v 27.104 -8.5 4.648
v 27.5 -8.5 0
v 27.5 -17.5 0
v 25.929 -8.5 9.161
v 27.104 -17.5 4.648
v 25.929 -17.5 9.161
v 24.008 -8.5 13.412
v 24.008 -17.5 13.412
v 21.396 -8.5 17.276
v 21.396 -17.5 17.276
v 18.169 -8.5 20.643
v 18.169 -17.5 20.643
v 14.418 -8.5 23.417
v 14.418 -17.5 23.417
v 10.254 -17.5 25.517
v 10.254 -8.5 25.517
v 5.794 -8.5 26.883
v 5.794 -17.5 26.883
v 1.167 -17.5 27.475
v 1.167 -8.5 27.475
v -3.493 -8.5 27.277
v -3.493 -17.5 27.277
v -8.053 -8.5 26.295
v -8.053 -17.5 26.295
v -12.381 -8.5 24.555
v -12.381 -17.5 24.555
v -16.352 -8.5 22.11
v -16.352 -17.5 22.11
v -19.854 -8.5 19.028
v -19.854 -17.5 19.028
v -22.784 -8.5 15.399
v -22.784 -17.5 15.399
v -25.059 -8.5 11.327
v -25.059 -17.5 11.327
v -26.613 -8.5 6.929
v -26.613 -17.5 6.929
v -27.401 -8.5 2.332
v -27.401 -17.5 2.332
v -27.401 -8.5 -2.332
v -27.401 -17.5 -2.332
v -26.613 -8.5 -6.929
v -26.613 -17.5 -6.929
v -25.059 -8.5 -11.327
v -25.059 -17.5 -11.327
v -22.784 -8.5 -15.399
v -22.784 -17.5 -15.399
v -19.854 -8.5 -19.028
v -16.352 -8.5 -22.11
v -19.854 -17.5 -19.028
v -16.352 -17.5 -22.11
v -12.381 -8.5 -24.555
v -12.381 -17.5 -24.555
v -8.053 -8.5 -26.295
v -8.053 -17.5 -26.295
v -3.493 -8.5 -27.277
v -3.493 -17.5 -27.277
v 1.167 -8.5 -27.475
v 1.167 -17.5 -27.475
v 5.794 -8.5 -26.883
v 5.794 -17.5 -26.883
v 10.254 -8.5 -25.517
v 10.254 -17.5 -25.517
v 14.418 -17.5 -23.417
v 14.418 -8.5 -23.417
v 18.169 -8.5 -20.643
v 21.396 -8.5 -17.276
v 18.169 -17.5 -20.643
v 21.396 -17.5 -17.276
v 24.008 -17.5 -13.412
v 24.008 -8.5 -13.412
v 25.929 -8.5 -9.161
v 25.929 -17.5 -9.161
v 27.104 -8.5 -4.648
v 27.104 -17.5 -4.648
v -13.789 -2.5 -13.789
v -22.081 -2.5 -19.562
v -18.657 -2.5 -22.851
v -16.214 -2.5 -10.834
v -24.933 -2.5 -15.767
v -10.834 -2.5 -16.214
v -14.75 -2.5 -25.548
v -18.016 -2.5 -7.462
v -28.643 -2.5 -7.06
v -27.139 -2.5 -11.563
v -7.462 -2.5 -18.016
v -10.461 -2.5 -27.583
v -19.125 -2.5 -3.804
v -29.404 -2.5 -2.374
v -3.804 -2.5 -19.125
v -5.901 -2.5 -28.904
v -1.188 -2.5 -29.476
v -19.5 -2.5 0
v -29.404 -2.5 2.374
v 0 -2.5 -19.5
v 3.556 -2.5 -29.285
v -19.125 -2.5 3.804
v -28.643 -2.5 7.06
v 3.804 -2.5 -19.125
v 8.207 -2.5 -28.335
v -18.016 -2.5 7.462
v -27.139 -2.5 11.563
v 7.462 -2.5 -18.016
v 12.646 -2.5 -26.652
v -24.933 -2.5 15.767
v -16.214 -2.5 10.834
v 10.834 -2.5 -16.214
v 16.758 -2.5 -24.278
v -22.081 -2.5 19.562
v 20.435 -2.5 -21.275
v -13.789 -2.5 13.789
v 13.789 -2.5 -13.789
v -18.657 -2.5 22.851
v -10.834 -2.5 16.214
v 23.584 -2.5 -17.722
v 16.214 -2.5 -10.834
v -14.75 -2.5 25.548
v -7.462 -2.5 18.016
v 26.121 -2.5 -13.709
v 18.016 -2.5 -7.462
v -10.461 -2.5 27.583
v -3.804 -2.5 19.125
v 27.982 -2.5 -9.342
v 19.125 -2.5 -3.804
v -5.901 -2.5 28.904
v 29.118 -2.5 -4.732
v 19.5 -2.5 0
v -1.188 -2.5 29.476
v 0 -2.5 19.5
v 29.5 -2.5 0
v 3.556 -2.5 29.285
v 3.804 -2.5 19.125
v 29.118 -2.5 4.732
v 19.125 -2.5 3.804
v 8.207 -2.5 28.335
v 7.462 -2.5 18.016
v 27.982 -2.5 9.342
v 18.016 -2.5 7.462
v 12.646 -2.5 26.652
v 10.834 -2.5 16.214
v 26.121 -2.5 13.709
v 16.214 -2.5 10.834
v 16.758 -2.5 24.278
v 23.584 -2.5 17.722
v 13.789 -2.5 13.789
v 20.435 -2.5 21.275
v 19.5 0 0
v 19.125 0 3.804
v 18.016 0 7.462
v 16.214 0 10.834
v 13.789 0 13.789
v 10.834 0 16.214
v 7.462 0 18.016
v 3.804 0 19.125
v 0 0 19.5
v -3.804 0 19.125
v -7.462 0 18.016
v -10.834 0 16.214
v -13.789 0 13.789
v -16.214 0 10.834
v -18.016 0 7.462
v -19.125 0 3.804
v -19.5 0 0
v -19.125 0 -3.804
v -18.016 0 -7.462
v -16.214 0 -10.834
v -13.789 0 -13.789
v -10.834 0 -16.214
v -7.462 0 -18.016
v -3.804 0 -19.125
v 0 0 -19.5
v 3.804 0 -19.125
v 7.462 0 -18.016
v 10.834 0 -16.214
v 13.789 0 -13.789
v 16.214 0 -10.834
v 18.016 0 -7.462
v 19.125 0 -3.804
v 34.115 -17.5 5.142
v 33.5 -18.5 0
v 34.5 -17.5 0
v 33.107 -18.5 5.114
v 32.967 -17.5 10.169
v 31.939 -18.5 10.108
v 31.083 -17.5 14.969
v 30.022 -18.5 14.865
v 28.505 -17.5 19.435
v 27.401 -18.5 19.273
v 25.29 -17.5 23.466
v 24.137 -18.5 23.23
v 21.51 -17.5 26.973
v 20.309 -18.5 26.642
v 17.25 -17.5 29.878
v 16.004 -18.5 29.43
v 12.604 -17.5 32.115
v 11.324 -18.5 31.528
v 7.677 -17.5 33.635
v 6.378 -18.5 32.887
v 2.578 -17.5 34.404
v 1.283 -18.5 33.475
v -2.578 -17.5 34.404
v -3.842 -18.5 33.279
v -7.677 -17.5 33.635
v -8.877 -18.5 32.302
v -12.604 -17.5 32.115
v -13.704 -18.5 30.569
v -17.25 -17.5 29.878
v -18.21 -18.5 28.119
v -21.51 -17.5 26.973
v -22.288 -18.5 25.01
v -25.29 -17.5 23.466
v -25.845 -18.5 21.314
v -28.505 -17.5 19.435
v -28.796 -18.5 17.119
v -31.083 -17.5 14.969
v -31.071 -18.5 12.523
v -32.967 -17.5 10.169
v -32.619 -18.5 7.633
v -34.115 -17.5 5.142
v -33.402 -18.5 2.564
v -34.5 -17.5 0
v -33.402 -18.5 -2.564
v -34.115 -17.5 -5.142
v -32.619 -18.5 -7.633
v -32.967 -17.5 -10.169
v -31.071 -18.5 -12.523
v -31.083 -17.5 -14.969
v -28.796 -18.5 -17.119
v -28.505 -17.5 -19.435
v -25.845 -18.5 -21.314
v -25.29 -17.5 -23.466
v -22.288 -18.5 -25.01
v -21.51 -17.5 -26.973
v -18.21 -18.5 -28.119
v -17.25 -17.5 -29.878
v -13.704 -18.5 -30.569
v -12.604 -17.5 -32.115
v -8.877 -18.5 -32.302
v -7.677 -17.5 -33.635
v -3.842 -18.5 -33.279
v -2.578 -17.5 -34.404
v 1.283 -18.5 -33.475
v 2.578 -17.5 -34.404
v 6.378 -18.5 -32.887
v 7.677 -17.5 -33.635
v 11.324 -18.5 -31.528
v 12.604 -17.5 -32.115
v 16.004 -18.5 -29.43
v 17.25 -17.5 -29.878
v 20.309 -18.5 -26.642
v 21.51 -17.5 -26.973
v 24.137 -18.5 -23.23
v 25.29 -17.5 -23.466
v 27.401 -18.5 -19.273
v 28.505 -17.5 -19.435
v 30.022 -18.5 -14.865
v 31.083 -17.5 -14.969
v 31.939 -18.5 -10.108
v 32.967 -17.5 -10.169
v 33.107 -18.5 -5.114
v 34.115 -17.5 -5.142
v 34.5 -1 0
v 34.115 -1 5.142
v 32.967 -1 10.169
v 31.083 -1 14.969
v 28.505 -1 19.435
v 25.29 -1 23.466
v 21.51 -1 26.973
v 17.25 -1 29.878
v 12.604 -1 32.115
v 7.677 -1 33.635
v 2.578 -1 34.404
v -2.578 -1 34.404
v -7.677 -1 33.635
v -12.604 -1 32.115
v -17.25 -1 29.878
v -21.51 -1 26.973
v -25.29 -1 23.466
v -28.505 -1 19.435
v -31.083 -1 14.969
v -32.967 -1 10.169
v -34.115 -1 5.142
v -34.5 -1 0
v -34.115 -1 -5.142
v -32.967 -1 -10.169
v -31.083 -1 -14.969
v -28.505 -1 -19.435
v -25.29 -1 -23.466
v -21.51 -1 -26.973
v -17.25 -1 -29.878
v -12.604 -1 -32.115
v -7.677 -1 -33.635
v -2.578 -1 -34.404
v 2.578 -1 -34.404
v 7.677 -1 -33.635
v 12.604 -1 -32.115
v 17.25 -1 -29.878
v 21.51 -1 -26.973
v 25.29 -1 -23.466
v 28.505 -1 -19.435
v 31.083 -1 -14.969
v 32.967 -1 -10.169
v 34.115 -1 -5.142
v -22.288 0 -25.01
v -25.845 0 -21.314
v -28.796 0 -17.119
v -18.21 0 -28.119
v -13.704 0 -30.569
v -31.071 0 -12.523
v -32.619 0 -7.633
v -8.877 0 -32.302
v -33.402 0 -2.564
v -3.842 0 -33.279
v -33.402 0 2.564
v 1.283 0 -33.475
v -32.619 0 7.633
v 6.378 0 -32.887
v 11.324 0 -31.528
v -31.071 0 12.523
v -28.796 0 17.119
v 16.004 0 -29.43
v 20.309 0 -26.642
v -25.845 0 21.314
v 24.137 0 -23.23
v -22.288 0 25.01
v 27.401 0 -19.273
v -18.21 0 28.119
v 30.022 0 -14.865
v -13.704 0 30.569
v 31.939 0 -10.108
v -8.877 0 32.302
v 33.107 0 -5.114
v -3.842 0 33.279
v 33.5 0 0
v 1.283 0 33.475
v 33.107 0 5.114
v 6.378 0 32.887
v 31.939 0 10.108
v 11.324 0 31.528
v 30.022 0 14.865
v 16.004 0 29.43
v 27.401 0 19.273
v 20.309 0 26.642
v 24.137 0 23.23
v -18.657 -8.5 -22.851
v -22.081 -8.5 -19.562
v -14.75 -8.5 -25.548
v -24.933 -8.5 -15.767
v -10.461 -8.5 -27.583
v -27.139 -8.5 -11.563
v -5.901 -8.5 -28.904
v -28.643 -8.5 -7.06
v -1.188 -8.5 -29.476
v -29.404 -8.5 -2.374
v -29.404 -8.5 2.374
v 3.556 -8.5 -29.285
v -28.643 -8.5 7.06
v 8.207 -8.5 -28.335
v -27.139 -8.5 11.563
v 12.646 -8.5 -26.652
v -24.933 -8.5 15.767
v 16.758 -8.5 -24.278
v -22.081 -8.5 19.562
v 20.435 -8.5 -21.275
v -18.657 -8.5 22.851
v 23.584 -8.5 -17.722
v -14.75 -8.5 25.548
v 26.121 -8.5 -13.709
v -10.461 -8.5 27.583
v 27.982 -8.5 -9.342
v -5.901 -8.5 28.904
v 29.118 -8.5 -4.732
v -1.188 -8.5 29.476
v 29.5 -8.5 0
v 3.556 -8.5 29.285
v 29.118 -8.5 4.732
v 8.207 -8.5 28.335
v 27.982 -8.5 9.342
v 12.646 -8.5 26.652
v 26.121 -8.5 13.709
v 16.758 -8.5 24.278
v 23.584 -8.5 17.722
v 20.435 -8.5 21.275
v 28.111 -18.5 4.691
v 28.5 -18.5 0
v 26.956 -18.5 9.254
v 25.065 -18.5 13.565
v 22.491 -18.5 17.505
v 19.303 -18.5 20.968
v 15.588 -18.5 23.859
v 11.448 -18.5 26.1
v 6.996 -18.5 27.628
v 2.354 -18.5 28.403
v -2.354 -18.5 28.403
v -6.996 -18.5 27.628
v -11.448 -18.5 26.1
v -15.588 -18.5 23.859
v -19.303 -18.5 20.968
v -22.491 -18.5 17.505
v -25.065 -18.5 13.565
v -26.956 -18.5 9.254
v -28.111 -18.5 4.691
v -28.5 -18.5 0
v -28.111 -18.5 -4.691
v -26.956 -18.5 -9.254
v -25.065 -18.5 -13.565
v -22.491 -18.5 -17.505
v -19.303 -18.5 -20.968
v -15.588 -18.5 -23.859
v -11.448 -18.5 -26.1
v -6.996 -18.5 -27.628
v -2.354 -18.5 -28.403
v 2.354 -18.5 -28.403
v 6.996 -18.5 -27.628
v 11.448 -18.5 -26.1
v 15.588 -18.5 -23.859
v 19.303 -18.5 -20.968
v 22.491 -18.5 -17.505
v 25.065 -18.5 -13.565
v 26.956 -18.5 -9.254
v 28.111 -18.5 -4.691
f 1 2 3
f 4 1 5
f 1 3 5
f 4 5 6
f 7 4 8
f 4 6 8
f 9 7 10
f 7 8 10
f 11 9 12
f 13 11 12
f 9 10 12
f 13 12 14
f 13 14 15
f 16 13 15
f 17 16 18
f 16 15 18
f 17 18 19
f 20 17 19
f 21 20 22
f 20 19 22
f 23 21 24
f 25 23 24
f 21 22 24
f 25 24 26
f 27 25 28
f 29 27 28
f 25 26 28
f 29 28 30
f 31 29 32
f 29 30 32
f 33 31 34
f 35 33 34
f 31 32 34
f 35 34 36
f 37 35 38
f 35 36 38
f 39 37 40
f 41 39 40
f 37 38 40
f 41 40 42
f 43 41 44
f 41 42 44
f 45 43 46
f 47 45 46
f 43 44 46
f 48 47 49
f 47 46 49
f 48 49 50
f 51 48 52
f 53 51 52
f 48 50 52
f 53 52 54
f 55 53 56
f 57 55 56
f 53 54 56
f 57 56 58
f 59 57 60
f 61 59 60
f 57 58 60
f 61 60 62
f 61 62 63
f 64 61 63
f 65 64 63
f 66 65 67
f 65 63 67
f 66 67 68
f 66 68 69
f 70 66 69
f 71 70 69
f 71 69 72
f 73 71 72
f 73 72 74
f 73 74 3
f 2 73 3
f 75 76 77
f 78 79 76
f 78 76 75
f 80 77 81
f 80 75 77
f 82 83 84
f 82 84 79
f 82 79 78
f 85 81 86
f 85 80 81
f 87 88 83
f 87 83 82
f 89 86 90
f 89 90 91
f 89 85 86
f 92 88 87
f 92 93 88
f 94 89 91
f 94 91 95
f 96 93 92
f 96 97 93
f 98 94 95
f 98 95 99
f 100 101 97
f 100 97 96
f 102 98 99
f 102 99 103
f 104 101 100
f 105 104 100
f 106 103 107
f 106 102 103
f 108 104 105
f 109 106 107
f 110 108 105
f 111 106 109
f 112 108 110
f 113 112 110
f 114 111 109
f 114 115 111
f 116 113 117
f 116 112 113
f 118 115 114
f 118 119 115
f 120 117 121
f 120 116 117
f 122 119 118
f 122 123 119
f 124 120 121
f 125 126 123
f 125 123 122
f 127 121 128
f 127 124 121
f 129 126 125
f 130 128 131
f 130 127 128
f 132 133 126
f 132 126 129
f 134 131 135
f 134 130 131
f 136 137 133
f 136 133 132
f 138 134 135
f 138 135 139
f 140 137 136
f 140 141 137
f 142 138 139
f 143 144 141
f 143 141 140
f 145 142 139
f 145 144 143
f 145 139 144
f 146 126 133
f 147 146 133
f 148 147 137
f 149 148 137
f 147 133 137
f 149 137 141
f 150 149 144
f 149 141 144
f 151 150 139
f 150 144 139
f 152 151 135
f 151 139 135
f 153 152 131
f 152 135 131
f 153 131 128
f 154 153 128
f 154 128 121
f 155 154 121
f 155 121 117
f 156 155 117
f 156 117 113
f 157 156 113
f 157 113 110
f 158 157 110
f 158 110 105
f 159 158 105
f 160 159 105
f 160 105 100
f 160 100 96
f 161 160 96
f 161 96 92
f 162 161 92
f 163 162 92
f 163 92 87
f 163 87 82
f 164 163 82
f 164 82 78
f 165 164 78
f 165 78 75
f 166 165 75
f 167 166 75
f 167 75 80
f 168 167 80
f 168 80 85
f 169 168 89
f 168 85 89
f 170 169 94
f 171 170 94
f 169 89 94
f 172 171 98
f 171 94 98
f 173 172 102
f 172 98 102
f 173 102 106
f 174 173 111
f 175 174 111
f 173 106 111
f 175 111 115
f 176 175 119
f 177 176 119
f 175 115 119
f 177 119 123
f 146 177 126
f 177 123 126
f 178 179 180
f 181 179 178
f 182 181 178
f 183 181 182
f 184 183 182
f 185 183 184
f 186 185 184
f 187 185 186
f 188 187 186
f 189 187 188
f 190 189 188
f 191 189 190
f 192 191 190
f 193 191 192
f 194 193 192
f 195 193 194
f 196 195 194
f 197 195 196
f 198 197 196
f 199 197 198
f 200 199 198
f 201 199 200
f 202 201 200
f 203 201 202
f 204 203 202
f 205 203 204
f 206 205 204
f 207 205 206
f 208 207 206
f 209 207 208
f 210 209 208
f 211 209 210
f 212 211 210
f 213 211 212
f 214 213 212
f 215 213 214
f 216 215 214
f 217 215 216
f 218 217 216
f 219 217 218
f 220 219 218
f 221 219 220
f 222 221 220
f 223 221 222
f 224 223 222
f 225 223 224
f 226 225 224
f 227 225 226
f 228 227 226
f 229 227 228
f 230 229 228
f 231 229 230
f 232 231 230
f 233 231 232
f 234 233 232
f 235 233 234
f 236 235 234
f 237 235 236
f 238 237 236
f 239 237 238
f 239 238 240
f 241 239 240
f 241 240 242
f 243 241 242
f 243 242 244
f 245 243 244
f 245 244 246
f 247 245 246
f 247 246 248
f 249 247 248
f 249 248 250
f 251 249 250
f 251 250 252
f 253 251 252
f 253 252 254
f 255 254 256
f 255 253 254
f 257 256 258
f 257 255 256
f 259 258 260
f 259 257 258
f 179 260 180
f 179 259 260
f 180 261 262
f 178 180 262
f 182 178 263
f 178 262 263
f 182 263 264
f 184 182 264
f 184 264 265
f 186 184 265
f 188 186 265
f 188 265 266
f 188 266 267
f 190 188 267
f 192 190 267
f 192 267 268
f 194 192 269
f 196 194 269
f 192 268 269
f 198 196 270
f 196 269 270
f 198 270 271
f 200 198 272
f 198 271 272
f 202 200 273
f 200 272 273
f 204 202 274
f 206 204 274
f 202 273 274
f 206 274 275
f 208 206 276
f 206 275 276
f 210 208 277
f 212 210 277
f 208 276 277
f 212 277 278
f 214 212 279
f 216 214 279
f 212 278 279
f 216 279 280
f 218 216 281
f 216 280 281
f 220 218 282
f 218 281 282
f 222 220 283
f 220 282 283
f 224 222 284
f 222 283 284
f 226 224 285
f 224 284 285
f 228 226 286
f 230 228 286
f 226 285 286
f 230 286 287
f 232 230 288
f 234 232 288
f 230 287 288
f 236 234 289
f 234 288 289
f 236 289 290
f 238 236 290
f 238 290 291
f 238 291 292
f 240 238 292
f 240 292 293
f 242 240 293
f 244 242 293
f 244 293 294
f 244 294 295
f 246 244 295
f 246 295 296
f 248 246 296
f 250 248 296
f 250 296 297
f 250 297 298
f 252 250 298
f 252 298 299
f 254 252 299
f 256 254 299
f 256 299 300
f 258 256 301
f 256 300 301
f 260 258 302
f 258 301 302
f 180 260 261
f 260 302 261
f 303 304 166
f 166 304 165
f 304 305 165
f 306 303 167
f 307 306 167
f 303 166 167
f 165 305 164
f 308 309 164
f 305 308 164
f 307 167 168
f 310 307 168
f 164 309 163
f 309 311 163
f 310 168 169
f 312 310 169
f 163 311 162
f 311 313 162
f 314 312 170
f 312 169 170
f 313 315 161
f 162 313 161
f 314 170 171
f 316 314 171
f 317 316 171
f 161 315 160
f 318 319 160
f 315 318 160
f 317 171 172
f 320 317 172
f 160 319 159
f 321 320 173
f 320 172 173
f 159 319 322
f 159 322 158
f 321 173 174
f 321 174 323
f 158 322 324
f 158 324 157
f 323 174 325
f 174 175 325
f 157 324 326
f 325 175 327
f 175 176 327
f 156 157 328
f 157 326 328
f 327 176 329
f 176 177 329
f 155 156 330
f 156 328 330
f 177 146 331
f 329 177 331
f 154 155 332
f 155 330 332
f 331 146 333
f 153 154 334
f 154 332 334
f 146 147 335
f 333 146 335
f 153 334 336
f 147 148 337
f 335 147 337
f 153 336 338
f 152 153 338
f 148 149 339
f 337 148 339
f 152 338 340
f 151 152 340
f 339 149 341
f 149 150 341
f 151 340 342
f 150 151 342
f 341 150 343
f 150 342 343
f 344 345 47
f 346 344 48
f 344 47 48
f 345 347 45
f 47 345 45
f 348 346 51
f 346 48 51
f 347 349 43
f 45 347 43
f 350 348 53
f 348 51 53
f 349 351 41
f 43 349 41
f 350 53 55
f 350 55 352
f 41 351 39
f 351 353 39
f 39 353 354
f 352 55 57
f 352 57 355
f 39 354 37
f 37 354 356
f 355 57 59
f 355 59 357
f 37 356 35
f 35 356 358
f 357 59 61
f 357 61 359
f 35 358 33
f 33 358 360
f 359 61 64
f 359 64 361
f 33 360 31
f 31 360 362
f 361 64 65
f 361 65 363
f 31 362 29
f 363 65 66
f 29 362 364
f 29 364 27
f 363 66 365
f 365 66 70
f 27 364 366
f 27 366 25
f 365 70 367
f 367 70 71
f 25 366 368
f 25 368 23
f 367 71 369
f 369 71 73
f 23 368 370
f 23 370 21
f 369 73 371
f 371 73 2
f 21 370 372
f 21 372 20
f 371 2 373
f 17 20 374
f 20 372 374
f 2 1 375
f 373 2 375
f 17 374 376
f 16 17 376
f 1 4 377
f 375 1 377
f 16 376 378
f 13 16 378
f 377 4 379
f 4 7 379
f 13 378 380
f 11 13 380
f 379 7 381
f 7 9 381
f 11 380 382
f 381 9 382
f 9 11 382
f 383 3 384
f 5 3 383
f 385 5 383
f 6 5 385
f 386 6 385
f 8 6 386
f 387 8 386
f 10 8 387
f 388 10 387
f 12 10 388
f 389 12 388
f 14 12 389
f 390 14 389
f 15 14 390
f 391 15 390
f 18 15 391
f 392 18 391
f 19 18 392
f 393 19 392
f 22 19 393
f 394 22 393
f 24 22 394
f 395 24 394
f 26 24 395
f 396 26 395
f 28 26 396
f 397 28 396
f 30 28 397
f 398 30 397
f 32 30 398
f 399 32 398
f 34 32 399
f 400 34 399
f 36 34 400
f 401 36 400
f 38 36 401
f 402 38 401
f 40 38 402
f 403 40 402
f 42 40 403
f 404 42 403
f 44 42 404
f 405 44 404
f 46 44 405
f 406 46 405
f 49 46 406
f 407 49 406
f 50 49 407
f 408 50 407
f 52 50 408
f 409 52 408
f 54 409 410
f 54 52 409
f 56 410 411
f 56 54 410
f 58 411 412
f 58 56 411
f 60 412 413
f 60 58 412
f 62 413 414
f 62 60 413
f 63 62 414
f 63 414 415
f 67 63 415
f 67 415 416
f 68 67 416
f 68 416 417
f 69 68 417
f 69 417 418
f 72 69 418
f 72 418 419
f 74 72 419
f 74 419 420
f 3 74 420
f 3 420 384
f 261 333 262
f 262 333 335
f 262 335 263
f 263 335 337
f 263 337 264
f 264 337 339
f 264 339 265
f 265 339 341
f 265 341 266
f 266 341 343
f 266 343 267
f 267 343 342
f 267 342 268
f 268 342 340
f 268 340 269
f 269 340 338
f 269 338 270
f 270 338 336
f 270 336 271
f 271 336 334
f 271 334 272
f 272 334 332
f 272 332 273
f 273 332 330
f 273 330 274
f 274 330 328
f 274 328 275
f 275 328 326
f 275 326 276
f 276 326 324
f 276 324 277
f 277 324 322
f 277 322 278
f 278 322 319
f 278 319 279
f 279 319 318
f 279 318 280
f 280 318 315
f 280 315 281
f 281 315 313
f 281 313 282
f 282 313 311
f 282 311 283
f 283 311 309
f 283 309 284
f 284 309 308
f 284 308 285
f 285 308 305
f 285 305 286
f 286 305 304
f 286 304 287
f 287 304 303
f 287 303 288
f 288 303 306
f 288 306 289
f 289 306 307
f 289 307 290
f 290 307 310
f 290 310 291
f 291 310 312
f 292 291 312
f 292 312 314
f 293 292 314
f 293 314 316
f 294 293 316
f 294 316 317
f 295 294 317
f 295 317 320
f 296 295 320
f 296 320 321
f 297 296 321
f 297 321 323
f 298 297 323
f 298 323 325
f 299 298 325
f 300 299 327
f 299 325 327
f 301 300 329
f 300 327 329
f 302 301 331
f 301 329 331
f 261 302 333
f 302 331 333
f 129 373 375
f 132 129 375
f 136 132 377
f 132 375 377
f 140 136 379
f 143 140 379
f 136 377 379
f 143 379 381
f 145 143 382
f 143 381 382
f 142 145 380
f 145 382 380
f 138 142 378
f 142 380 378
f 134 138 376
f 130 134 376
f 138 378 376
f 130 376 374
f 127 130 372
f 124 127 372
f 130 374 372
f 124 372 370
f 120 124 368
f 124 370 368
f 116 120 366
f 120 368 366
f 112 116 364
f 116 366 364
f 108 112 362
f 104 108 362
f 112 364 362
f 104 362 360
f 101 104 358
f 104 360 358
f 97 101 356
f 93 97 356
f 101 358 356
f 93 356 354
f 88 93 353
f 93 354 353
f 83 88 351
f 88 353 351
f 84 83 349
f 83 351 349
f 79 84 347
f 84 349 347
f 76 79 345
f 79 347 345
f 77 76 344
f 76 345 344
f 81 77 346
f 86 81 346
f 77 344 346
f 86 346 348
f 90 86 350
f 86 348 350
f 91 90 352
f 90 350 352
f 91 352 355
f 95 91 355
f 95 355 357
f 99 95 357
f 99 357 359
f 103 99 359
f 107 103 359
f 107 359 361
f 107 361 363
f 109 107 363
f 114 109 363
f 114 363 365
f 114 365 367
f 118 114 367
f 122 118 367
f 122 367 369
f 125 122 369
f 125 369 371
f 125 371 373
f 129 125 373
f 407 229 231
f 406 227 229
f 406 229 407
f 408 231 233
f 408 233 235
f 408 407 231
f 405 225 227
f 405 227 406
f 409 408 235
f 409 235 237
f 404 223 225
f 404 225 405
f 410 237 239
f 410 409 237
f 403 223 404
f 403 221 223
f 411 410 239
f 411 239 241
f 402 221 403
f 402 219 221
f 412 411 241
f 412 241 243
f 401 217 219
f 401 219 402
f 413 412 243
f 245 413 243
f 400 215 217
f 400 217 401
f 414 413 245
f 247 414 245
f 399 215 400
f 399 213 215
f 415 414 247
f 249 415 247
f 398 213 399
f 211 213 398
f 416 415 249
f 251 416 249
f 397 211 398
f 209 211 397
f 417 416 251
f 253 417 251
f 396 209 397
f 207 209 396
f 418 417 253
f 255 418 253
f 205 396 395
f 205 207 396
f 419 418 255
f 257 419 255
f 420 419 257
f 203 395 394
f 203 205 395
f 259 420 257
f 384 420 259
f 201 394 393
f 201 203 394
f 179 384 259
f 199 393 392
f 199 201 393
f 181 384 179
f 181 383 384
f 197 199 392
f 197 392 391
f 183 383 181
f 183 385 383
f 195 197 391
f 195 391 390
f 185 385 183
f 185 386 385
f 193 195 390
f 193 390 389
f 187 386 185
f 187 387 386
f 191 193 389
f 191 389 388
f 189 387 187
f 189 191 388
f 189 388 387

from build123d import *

# Parameters (mm, degrees)
F0_R     = 34.5
F1_DEPTH = 18.5
F2_R     = 27.5
F3_DEPTH = 10
F4_R     = 29.5
F5_DEPTH = 6
F6_R     = 19.5
F7_DEPTH = 2.501
F8_SIZE  = 1


with BuildPart() as f1:
    # F0 (on Front) → F1 (new body)
    with BuildSketch(Plane.XZ):
        Circle(F0_R)
    extrude(amount=F1_DEPTH)

    # F2 (on face) → F3 (cut)
    with BuildSketch(Plane.XZ.offset(18.5)):
        Circle(F2_R)
    extrude(amount=-F3_DEPTH, mode=Mode.SUBTRACT)

    # F4 (on face) → F5 (cut)
    with BuildSketch(Plane.XZ.offset(8.5)):
        Circle(F4_R)
    extrude(amount=-F5_DEPTH, mode=Mode.SUBTRACT)

    # F6 (on face) → F7 (cut, through all)
    with BuildSketch(Plane.XZ.offset(2.5)):
        Circle(F6_R)
    extrude(amount=-F7_DEPTH, mode=Mode.SUBTRACT)

    # F8
    f8_edges = [f1.edges().sort_by_distance(p)[0] for p in [
        (-34.5, -18.5, 0),
        (-27.5, -18.5, 0),
        (-34.5, 0, 0),
    ]]
    chamfer(f8_edges, length=F8_SIZE)


solid = f1.part
